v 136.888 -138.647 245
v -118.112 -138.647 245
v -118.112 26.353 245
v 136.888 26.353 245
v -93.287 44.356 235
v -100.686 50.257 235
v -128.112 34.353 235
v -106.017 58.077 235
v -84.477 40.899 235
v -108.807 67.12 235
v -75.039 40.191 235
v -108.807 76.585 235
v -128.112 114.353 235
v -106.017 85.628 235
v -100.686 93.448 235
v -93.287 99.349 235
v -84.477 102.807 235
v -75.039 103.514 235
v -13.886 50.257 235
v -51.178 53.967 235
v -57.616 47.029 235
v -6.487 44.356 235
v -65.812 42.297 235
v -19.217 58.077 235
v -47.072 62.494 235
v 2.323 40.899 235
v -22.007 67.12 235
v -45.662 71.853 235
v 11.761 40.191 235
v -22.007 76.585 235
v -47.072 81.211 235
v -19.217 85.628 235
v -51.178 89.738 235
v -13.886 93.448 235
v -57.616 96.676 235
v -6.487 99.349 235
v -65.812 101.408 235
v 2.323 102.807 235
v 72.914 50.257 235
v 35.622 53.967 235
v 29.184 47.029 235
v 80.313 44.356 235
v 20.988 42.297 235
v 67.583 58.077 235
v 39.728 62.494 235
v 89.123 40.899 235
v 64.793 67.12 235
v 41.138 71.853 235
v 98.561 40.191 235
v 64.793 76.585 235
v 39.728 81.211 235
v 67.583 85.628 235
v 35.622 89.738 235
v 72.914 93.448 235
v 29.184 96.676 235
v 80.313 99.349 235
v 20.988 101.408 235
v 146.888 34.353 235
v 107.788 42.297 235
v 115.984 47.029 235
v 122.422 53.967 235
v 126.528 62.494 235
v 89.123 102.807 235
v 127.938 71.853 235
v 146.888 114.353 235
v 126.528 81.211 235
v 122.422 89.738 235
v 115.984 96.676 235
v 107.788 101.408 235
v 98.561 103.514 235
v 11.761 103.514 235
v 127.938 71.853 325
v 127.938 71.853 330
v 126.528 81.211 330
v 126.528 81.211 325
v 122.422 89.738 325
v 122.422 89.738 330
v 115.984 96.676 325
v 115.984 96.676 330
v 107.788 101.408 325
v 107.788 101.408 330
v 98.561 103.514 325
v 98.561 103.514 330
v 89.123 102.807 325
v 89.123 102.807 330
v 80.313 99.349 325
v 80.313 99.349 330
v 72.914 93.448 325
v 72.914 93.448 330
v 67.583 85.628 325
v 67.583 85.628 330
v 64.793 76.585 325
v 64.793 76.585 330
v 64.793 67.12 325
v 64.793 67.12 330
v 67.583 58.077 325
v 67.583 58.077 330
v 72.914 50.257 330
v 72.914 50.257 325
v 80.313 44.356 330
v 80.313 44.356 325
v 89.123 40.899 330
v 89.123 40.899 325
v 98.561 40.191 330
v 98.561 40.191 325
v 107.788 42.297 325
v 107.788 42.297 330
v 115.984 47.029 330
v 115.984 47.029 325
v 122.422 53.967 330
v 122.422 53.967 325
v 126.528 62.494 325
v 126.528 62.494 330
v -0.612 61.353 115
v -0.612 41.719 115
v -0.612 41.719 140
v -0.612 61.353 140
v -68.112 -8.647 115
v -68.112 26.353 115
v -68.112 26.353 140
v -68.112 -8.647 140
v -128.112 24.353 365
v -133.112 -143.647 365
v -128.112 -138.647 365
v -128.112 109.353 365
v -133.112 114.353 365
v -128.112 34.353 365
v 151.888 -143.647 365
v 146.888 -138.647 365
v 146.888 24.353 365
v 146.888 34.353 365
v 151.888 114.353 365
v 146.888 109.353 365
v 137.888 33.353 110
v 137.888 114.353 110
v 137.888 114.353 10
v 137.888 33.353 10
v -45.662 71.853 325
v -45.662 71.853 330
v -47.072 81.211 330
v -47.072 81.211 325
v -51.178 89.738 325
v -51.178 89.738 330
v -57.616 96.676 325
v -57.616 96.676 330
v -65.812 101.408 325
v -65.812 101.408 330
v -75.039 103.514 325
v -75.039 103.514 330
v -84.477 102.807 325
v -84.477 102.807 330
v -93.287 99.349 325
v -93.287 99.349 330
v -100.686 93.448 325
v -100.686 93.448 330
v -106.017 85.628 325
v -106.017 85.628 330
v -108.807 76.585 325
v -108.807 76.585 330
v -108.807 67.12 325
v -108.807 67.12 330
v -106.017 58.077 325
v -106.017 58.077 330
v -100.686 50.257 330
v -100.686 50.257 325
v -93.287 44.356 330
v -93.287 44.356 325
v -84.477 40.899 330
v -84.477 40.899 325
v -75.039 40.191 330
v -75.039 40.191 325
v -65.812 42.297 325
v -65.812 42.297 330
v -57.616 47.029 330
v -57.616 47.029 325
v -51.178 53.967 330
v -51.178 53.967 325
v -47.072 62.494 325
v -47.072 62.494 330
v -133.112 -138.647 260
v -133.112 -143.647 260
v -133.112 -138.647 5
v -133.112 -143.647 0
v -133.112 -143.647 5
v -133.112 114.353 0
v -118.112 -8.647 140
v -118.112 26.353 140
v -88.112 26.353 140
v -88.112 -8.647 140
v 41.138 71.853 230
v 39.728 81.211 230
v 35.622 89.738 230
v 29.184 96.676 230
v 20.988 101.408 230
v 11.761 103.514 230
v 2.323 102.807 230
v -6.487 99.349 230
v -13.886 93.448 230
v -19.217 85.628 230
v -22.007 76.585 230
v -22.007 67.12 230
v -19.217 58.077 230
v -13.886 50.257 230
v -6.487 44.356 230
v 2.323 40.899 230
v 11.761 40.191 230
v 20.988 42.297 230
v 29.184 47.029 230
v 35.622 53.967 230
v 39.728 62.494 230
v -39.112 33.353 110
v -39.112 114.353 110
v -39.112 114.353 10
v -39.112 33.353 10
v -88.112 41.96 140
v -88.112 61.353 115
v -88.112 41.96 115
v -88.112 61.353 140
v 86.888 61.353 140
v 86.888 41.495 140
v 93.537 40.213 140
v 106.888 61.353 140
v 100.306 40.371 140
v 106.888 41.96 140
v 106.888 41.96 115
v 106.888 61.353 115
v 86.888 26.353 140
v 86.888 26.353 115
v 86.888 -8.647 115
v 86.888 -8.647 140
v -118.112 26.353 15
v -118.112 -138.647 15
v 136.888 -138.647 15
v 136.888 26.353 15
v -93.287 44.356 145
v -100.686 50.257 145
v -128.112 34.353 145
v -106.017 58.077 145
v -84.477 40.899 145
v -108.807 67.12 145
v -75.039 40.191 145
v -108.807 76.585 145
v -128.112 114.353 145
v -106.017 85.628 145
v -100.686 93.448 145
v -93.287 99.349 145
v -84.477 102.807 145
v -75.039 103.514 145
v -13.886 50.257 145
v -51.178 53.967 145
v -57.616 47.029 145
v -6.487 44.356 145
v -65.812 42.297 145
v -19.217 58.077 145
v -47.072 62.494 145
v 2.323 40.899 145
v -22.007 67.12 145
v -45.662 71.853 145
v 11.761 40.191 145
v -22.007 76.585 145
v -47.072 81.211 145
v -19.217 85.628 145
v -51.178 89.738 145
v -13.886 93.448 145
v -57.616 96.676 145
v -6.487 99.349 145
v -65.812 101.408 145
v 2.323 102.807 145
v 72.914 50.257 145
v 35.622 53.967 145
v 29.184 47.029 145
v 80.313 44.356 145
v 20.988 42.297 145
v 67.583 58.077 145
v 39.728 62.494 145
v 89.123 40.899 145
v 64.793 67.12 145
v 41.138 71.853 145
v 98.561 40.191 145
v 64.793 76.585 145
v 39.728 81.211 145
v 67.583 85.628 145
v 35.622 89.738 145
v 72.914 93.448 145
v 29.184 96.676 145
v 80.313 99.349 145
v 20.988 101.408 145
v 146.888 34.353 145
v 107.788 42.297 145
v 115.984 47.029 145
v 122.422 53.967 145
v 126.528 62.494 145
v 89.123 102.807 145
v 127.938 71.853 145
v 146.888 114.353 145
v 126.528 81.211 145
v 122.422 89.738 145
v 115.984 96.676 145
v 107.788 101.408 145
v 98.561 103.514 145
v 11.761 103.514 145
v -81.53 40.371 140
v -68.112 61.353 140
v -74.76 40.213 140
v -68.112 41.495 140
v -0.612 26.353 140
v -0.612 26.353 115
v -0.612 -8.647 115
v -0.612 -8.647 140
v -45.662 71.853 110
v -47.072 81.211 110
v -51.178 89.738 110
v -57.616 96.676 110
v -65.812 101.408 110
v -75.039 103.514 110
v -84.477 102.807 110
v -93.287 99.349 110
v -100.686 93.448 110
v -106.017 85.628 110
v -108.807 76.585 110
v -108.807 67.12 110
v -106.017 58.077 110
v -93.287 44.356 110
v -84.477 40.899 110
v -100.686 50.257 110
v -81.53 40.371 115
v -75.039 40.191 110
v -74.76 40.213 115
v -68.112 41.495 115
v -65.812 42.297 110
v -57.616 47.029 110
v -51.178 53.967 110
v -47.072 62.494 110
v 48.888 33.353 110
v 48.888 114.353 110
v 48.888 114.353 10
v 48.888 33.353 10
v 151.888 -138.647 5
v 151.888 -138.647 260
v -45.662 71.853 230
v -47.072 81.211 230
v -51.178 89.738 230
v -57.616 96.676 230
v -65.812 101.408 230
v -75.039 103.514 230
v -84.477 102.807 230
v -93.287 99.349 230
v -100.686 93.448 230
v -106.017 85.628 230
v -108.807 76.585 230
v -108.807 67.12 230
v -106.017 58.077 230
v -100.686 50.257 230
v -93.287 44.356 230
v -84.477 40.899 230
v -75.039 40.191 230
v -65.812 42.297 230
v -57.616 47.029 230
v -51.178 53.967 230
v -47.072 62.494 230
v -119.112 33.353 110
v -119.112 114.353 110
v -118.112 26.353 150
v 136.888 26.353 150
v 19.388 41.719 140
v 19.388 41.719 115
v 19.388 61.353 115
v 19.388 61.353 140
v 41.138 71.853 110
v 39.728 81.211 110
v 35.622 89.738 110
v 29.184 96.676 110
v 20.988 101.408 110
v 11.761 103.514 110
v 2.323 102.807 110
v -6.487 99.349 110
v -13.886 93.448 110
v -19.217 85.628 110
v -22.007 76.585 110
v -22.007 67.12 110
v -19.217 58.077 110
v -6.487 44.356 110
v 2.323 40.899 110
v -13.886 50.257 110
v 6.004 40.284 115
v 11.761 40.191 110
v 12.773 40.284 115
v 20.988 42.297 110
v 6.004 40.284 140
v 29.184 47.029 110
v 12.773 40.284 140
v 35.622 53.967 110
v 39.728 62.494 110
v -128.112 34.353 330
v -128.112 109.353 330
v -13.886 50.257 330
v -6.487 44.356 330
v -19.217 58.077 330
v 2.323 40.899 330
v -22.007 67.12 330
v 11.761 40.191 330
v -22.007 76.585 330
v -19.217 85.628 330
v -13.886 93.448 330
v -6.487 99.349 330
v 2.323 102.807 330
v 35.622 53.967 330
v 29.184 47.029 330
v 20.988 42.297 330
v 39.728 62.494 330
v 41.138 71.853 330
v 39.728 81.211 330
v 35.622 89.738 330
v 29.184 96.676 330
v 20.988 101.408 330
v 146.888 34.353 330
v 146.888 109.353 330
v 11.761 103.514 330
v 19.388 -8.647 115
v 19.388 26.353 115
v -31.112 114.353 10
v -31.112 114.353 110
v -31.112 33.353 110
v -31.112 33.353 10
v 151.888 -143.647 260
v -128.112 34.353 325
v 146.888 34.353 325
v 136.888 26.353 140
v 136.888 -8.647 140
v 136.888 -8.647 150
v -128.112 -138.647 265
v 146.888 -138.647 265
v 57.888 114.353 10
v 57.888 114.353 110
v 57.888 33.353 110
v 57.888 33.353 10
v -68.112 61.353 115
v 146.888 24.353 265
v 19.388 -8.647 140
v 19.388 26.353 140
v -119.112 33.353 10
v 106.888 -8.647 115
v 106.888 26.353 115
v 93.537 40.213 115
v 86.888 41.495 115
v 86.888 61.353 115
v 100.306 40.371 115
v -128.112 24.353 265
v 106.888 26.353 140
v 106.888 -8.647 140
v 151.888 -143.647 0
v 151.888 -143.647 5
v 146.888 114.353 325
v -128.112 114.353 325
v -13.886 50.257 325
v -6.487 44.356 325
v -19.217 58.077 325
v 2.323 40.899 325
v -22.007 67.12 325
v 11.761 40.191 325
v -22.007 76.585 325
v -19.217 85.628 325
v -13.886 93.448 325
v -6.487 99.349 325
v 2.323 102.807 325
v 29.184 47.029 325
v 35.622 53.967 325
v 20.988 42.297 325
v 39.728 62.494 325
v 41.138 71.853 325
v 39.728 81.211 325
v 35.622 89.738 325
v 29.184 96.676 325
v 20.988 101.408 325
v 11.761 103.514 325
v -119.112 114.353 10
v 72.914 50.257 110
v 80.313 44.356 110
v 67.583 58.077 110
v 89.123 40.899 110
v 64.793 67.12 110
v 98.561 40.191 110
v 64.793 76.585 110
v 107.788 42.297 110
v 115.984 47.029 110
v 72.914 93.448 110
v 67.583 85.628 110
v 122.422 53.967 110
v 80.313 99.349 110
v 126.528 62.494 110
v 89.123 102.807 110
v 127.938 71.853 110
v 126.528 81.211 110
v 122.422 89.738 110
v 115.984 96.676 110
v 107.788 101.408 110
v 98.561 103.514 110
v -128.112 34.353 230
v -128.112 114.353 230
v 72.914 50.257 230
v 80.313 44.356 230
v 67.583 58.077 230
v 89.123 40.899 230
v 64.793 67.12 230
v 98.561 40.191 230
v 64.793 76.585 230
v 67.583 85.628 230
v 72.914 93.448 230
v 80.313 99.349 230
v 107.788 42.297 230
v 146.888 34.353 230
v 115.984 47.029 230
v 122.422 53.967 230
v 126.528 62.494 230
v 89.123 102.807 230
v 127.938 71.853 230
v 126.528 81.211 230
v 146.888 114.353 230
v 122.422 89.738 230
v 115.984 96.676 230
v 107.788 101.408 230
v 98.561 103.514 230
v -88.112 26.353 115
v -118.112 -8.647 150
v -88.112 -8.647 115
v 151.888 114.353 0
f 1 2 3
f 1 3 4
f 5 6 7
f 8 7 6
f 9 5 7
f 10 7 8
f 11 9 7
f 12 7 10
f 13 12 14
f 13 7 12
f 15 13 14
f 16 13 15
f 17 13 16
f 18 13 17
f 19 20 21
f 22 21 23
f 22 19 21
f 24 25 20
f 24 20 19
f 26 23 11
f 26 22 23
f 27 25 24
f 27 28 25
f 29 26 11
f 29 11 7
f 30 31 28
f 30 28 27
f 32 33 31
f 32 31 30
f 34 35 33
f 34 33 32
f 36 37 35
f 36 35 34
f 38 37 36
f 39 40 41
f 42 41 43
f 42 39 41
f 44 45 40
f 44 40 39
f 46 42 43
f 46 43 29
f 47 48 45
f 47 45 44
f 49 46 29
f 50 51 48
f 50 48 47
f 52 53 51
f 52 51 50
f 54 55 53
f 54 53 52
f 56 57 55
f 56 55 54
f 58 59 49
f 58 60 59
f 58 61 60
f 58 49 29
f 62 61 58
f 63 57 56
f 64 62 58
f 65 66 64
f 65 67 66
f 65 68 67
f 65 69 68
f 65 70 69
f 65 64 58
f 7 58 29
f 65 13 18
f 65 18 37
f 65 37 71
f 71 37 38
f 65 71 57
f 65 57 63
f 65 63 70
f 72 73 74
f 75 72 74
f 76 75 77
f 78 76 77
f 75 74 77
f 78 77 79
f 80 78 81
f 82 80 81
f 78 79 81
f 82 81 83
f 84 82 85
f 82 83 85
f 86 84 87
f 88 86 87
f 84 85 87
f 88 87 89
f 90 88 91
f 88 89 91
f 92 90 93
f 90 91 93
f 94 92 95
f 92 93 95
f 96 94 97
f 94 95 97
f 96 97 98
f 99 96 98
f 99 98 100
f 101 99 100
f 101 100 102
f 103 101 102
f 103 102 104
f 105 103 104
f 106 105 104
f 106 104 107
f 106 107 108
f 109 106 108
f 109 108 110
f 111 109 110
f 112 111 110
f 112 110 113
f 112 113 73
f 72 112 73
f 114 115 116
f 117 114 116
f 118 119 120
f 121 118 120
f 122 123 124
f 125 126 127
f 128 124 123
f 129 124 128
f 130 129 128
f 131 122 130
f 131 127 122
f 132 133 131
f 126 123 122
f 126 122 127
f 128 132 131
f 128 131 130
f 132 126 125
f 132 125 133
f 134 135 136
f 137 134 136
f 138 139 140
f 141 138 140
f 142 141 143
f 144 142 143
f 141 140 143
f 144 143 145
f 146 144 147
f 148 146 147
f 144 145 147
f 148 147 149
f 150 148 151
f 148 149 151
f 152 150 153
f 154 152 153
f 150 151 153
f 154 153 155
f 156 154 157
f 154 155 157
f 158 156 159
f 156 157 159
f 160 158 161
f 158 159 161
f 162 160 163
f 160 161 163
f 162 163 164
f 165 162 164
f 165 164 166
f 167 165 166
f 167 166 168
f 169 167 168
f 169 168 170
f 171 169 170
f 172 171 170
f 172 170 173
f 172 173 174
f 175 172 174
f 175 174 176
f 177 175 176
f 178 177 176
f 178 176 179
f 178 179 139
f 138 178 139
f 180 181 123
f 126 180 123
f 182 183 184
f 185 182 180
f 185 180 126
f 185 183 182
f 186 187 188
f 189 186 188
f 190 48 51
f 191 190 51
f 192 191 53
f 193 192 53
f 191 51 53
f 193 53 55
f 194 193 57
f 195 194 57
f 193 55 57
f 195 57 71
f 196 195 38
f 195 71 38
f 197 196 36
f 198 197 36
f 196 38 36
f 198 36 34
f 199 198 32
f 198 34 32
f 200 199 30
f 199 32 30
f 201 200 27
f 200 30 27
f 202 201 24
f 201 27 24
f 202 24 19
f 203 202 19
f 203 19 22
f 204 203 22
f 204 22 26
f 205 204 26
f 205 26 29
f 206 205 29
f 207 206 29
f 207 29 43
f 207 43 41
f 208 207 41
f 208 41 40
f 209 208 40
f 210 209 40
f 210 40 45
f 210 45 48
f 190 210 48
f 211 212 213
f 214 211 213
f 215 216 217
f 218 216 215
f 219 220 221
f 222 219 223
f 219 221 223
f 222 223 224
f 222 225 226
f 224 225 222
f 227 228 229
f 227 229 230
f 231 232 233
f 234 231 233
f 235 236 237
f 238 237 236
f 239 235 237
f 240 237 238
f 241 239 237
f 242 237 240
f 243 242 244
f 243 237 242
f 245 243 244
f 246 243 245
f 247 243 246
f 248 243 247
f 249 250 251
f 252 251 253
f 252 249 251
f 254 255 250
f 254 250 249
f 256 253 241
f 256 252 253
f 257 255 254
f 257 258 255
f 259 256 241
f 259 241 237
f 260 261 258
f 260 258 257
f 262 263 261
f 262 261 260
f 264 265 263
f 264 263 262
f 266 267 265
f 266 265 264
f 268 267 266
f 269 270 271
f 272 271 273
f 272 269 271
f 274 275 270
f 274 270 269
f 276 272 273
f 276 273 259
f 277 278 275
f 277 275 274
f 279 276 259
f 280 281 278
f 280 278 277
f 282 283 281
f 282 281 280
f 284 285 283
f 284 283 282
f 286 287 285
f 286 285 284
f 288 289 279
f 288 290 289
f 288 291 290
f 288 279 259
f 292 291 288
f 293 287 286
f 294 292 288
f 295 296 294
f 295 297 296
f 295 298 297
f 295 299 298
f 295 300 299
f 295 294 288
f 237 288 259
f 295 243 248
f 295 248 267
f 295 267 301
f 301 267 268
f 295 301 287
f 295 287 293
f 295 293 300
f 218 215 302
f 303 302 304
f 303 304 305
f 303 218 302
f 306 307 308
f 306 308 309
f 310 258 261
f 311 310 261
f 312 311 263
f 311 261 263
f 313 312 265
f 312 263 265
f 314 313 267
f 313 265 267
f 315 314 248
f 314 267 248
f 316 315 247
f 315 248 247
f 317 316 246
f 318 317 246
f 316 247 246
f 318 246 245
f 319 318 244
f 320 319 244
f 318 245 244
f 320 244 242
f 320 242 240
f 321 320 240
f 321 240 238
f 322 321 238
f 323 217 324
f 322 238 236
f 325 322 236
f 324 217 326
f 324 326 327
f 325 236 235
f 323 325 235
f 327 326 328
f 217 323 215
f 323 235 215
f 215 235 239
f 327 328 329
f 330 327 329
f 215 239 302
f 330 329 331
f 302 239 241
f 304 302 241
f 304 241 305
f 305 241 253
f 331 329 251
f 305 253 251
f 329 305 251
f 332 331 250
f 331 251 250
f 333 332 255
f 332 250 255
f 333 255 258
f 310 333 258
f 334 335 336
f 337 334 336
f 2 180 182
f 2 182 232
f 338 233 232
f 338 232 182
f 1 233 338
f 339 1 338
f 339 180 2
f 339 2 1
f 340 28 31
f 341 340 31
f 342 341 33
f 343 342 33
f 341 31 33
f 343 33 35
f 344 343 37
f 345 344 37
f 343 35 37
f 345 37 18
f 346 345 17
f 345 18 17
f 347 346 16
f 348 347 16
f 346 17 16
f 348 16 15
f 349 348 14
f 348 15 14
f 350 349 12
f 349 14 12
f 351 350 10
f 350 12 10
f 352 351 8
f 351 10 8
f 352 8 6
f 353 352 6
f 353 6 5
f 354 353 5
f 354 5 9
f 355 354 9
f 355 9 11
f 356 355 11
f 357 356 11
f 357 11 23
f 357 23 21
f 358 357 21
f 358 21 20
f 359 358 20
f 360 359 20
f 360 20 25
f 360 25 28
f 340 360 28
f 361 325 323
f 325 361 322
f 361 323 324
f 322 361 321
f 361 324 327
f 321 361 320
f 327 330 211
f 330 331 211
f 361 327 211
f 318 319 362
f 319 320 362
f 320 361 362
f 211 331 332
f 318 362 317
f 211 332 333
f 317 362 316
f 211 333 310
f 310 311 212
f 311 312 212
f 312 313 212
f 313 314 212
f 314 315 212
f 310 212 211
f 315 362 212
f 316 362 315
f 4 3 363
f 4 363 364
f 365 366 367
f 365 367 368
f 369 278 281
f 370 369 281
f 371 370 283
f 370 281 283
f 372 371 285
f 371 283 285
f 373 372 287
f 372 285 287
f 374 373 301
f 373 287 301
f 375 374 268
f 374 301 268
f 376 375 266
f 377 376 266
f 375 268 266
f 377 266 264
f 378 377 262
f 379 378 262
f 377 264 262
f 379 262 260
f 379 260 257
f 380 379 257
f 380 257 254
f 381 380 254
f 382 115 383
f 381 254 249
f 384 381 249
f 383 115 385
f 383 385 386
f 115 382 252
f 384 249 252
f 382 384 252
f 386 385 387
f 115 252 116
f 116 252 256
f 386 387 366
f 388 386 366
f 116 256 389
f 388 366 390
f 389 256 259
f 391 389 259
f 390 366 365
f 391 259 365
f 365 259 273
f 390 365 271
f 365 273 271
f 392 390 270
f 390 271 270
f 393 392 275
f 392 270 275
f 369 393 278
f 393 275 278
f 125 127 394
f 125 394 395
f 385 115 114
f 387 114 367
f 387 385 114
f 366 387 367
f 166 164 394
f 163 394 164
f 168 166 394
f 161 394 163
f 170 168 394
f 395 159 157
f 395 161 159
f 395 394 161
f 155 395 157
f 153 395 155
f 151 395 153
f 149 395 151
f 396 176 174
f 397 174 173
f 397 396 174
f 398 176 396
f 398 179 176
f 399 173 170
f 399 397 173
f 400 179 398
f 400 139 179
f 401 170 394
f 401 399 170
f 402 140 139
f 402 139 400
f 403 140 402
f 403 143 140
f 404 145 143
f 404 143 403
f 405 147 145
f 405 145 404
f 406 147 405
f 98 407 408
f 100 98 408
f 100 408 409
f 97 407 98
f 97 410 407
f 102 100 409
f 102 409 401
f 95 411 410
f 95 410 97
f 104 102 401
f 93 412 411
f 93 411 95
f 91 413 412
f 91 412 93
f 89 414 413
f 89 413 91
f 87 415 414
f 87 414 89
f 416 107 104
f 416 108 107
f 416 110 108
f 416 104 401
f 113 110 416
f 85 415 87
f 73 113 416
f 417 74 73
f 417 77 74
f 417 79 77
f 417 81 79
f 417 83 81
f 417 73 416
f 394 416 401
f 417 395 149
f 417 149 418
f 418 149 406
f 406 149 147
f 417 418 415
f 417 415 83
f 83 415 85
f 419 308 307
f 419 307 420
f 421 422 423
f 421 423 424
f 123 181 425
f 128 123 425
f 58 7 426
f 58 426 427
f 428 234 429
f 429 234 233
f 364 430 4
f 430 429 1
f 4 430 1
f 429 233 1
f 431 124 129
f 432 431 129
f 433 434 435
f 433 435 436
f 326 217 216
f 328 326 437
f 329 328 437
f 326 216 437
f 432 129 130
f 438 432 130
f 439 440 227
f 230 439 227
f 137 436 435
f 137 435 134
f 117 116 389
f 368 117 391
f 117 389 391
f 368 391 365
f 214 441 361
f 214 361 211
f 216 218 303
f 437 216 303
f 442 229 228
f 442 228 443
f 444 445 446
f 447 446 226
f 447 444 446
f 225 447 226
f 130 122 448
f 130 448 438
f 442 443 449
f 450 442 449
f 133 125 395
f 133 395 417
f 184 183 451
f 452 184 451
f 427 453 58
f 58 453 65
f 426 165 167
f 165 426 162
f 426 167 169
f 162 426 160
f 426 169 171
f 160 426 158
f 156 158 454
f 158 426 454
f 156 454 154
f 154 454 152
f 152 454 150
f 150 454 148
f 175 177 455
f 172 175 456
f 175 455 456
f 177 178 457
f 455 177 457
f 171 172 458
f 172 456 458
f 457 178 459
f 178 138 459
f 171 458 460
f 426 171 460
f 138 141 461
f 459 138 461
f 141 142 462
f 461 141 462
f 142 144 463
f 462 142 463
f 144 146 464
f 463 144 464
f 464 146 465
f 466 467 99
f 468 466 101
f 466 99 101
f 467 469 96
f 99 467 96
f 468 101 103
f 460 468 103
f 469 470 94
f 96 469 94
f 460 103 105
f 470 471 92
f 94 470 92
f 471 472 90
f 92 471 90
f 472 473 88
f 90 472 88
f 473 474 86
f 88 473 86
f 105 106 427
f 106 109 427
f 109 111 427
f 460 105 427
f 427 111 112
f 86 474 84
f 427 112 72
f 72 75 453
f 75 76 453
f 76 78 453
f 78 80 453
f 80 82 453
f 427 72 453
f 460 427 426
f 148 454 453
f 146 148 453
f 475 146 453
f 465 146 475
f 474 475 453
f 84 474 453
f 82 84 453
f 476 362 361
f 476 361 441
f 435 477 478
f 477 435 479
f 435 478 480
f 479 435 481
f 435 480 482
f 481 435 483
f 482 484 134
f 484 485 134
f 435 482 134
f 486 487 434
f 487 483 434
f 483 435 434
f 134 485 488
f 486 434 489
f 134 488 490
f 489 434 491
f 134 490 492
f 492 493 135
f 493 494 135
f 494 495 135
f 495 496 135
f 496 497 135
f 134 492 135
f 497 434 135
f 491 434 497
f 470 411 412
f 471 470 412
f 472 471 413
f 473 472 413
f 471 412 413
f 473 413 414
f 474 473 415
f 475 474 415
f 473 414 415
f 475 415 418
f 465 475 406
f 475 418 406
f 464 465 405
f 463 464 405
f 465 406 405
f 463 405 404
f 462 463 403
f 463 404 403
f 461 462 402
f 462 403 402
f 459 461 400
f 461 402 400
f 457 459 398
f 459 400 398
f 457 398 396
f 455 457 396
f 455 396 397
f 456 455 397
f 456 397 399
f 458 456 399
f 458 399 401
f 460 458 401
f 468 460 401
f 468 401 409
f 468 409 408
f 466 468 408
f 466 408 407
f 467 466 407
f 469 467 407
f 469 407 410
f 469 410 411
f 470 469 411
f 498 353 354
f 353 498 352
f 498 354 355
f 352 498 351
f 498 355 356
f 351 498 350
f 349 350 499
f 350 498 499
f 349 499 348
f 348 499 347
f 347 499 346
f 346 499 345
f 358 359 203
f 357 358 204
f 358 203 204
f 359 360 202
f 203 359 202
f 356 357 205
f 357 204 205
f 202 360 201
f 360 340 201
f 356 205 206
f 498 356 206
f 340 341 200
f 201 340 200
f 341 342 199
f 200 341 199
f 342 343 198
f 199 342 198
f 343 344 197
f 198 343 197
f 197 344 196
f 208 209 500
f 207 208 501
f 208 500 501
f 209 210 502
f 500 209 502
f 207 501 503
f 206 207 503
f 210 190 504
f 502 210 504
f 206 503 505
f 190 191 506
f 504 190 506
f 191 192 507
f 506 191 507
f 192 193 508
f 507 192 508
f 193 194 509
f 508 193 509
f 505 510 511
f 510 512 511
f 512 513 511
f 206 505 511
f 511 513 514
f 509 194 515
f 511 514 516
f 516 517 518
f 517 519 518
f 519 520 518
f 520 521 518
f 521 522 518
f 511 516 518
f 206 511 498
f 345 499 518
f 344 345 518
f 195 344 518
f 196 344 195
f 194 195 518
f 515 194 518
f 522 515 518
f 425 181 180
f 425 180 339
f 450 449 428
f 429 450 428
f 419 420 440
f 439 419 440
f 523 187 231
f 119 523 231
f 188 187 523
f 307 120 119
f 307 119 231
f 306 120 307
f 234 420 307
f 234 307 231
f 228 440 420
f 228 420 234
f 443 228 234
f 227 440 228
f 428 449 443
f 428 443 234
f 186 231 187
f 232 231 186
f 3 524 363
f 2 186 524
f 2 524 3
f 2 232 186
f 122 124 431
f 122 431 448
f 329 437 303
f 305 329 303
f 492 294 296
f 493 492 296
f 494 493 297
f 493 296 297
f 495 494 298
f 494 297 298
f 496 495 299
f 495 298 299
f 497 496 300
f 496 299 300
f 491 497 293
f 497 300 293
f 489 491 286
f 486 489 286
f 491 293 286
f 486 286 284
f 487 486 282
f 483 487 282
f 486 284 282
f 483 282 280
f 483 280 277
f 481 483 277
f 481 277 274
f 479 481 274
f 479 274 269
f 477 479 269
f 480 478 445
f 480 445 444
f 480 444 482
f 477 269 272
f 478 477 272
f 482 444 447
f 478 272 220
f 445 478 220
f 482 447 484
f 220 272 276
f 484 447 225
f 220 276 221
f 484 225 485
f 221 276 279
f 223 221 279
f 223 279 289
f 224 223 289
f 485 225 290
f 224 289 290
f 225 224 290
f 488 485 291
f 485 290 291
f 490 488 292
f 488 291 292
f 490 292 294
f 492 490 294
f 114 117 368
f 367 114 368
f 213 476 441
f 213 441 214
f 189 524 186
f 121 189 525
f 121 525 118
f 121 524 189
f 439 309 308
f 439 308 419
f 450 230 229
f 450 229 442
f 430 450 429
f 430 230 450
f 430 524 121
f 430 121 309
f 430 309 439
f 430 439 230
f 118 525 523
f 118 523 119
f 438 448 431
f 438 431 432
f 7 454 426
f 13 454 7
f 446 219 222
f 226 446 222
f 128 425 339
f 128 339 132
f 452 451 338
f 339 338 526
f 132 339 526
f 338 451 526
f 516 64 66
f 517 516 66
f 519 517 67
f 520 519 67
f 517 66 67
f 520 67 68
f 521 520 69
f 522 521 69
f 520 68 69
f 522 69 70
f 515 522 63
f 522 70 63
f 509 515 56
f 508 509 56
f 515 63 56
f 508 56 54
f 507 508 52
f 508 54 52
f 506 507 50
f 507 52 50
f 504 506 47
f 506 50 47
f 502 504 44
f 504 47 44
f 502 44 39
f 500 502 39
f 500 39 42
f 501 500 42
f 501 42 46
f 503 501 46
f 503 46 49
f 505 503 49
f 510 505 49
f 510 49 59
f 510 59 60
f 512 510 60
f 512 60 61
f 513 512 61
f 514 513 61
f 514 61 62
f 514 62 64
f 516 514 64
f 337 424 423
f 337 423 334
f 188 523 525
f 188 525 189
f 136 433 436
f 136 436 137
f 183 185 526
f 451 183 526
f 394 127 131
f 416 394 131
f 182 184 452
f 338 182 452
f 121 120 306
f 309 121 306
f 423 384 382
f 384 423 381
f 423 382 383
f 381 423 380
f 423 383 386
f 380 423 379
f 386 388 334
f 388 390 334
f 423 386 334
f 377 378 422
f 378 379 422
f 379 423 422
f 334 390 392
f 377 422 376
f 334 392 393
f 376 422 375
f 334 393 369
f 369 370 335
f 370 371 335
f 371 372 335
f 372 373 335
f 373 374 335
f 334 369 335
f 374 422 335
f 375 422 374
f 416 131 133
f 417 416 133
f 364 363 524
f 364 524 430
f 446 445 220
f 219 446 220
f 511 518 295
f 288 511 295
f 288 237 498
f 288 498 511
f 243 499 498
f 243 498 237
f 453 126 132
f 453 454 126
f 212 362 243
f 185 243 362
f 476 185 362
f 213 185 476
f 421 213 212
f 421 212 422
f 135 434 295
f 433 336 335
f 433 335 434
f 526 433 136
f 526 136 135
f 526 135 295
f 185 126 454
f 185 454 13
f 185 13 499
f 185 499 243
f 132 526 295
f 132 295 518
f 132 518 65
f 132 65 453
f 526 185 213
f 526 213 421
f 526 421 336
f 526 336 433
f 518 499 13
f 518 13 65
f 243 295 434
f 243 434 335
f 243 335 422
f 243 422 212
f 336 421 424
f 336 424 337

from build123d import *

# Parameters (mm, degrees)
SKETCH2_W           = 285
SKETCH2_H           = 258
BOSS_EXTRUDE1_DEPTH = 365
SKETCH3_W           = 275
SKETCH3_H           = 75
CUT_EXTRUDE1_DEPTH  = 35
SKETCH5_W           = 80
SKETCH5_H           = 100
CUT_EXTRUDE2_DEPTH  = 81
SKETCH4_R           = 31.75
CUT_EXTRUDE4_DEPTH  = 276
SKETCH6_W           = 275
SKETCH6_H           = 85
SKETCH6_H_2         = 90
CUT_EXTRUDE6_DEPTH  = 80
SKETCH8_W           = 275
SKETCH8_H           = 163
CUT_EXTRUDE10_DEPTH = 100
SKETCH16_W          = 285
SKETCH16_H          = 255
CUT_EXTRUDE11_DEPTH = 5
SKETCH17_W          = 255
SKETCH17_H          = 230
CUT_EXTRUDE12_DEPTH = 165
SKETCH18_W          = 255
SKETCH18_H          = 10
BOSS_EXTRUDE2_DEPTH = 35
SKETCH19_W          = 20
SKETCH19_H          = 25
BOSS_EXTRUDE3_DEPTH = 35
SKETCH20_W          = 20
SKETCH20_H          = 25
BOSS_EXTRUDE4_DEPTH = 35


with BuildPart() as part:
    # Sketch2 → Boss-Extrude1 (new body)
    with BuildSketch(Plane.XY):
        with Locations((9.388446215, -14.647410359)):
            Rectangle(SKETCH2_W, SKETCH2_H)
    extrude(amount=BOSS_EXTRUDE1_DEPTH)

    # Sketch3 → Cut-Extrude1 (cut)
    with BuildSketch(Plane.XY.offset(365)):
        with Locations((9.388446215, 71.852589641)):
            Rectangle(SKETCH3_W, SKETCH3_H)
    extrude(amount=-CUT_EXTRUDE1_DEPTH, mode=Mode.SUBTRACT)

    # Sketch5 → Cut-Extrude2 (cut)
    with BuildSketch(Plane(origin=(0, 114.352589641, 0), x_dir=(1, 0, 0), z_dir=(0, 1, 0))):
        with Locations((-79.111553785, -60)):
            Rectangle(SKETCH5_W, SKETCH5_H)
        with Locations((8.888446215, -60)):
            Rectangle(SKETCH5_W, SKETCH5_H)
        with Locations((97.888446215, -60)):
            Rectangle(SKETCH5_W, SKETCH5_H)
    extrude(amount=-CUT_EXTRUDE2_DEPTH, mode=Mode.SUBTRACT)

    # Sketch4 → Cut-Extrude4 (cut)
    with BuildSketch(Plane.XY.offset(330)):
        with Locations((-77.411553785, 71.852589641)):
            Circle(SKETCH4_R)
        with Locations((9.388446215, 71.852589641)):
            Circle(SKETCH4_R)
        with Locations((96.188446215, 71.852589641)):
            Circle(SKETCH4_R)
    extrude(amount=-CUT_EXTRUDE4_DEPTH, mode=Mode.SUBTRACT)

    # Sketch6 → Cut-Extrude6 (cut)
    with BuildSketch(Plane(origin=(0, 114.352589641, 0), x_dir=(1, 0, 0), z_dir=(0, 1, 0))):
        with Locations((9.388446215, -187.5)):
            Rectangle(SKETCH6_W, SKETCH6_H)
        with Locations((9.388446215, -280)):
            Rectangle(SKETCH6_W, SKETCH6_H_2)
    extrude(amount=-CUT_EXTRUDE6_DEPTH, mode=Mode.SUBTRACT)

    # Sketch8 → Cut-Extrude10 (cut)
    with BuildSketch(Plane.XY.offset(365)):
        with Locations((9.388446215, -57.147410359)):
            Rectangle(SKETCH8_W, SKETCH8_H)
    extrude(amount=-CUT_EXTRUDE10_DEPTH, mode=Mode.SUBTRACT)

    # Sketch16 → Cut-Extrude11 (cut)
    with BuildSketch(Plane.XZ.offset(143.647410359)):
        with Locations((9.388446215, 132.5)):
            Rectangle(SKETCH16_W, SKETCH16_H)
    extrude(amount=-CUT_EXTRUDE11_DEPTH, mode=Mode.SUBTRACT)

    # Sketch17 → Cut-Extrude12 (cut)
    with BuildSketch(Plane.XZ.offset(138.647410359)):
        with Locations((9.388446215, 130)):
            Rectangle(SKETCH17_W, SKETCH17_H)
    extrude(amount=-CUT_EXTRUDE12_DEPTH, mode=Mode.SUBTRACT)

    # Sketch18 → Boss-Extrude2 (add)
    with BuildSketch(Plane.XZ.offset(-26.352589641)):
        with Locations((9.388446215, 145)):
            Rectangle(SKETCH18_W, SKETCH18_H)
    extrude(amount=BOSS_EXTRUDE2_DEPTH)

    # Sketch19 → Boss-Extrude3 (add, symmetric)
    with BuildSketch(Plane.XZ.offset(-26.352589641)):
        with Locations((9.388446215, 127.5)):
            Rectangle(SKETCH19_W, SKETCH19_H)
    extrude(amount=BOSS_EXTRUDE3_DEPTH, both=True)

    # Sketch20 → Boss-Extrude4 (add, symmetric)
    with BuildSketch(Plane.XZ.offset(-26.352589641)):
        with Locations((-78.111553785, 127.5)):
            Rectangle(SKETCH20_W, SKETCH20_H)
        with Locations((96.888446215, 127.5)):
            Rectangle(SKETCH20_W, SKETCH20_H)
    extrude(amount=BOSS_EXTRUDE4_DEPTH, both=True)


solid = part.part
